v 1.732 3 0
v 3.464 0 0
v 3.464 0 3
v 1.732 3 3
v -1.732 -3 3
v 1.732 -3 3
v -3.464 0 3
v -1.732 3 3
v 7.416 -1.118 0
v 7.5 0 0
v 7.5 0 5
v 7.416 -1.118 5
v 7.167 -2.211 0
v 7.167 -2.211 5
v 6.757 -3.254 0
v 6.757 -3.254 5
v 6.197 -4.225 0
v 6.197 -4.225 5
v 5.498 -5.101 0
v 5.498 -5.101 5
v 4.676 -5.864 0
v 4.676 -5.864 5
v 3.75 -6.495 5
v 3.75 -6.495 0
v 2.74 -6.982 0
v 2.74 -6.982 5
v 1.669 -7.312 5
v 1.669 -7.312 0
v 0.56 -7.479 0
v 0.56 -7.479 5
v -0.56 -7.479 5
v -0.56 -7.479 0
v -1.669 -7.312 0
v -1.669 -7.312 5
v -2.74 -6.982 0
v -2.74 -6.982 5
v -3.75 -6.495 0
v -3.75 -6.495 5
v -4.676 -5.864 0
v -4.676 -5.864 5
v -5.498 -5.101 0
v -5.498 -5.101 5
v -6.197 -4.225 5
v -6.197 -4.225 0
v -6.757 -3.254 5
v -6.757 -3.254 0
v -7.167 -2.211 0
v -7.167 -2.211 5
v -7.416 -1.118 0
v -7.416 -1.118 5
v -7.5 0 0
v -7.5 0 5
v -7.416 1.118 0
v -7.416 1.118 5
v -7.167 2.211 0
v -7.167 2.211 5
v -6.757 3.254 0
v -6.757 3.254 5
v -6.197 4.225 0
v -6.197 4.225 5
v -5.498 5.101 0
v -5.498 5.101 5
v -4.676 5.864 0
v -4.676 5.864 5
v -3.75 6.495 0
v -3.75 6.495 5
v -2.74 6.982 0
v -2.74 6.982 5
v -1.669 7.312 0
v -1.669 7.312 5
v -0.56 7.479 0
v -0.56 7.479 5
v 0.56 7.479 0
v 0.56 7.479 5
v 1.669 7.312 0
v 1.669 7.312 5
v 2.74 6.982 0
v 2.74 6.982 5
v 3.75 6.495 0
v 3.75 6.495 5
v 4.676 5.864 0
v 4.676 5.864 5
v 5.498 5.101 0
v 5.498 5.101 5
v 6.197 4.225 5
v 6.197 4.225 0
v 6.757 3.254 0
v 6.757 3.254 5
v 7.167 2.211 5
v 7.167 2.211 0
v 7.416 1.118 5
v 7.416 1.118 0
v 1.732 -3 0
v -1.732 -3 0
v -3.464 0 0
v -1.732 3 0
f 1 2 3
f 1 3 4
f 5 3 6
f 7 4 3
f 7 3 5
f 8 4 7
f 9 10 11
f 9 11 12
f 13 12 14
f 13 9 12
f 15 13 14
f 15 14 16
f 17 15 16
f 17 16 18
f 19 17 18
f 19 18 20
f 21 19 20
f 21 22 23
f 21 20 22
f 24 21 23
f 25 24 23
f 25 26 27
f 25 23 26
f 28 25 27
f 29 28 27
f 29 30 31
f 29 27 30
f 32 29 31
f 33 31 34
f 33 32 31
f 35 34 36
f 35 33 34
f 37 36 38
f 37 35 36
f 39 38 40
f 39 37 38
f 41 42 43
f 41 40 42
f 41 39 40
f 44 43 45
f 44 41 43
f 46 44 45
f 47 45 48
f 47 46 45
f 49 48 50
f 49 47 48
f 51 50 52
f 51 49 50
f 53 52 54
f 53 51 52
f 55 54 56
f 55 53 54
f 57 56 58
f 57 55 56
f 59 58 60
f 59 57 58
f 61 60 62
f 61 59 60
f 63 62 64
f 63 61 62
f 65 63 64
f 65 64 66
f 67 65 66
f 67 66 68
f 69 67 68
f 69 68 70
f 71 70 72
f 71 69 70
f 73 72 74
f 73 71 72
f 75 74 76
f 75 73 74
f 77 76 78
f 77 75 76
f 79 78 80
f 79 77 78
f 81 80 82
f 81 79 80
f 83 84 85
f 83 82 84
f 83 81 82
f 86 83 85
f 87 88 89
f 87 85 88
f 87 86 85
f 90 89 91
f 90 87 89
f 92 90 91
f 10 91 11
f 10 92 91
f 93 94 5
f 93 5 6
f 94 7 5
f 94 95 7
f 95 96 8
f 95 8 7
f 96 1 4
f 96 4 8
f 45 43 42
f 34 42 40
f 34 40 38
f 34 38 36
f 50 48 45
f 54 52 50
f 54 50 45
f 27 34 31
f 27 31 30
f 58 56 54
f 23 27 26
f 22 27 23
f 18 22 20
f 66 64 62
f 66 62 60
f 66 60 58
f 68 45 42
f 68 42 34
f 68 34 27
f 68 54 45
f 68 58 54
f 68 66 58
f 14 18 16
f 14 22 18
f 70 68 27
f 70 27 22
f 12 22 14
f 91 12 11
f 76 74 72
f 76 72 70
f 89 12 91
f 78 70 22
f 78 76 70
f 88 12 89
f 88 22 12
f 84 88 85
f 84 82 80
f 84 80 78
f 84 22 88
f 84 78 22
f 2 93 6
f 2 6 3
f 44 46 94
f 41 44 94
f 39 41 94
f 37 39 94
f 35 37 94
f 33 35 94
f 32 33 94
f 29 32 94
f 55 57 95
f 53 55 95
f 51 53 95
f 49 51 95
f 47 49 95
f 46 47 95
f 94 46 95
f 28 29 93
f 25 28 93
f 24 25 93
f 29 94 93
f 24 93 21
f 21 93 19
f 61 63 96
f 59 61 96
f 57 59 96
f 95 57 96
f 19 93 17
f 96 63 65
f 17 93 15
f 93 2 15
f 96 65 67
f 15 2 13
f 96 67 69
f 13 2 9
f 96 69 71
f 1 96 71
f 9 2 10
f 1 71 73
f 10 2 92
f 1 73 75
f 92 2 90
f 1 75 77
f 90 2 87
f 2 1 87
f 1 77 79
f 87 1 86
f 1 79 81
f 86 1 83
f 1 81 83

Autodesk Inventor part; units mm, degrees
ref_plane "YZ Plane" through (0, 0, 0) normal (1, 0, 0) x (0, 1, 0)
ref_plane "XZ Plane" through (0, 0, 0) normal (0, 1, 0) x (-1, 0, 0)
ref_plane "XY Plane" through (0, 0, 0) normal (0, 0, 1) x (1, 0, 0)
sketch "Эскиз1" plane through (0, 0, 0) normal (0, 0, 1) x (1, 0, 0)
  circle A0 centre (0, 0) radius 7.5
  dimension "d0" = 15
extrude "Выдавливание1" add sketch "Эскиз1" along normal blind 5
sketch "Эскиз2" plane through (0, 0, 0) normal (0, 0, -1) x (-1, 0, 0)
  circle A0 centre (0, 0) radius 3 construction
  line L0 (1.7321, 3) -> (3.4641, 0)
  line L1 (3.4641, 0) -> (1.7321, -3)
  line L2 (1.7321, -3) -> (-1.7321, -3)
  line L3 (-1.7321, -3) -> (-3.4641, 0)
  line L4 (-3.4641, 0) -> (-1.7321, 3)
  line L5 (-1.7321, 3) -> (1.7321, 3)
  point P0 (0, 3)
  dimension "d3" = 6
extrude "Выдавливание2" cut sketch "Эскиз2" against normal blind 3
properties part number "hand"
